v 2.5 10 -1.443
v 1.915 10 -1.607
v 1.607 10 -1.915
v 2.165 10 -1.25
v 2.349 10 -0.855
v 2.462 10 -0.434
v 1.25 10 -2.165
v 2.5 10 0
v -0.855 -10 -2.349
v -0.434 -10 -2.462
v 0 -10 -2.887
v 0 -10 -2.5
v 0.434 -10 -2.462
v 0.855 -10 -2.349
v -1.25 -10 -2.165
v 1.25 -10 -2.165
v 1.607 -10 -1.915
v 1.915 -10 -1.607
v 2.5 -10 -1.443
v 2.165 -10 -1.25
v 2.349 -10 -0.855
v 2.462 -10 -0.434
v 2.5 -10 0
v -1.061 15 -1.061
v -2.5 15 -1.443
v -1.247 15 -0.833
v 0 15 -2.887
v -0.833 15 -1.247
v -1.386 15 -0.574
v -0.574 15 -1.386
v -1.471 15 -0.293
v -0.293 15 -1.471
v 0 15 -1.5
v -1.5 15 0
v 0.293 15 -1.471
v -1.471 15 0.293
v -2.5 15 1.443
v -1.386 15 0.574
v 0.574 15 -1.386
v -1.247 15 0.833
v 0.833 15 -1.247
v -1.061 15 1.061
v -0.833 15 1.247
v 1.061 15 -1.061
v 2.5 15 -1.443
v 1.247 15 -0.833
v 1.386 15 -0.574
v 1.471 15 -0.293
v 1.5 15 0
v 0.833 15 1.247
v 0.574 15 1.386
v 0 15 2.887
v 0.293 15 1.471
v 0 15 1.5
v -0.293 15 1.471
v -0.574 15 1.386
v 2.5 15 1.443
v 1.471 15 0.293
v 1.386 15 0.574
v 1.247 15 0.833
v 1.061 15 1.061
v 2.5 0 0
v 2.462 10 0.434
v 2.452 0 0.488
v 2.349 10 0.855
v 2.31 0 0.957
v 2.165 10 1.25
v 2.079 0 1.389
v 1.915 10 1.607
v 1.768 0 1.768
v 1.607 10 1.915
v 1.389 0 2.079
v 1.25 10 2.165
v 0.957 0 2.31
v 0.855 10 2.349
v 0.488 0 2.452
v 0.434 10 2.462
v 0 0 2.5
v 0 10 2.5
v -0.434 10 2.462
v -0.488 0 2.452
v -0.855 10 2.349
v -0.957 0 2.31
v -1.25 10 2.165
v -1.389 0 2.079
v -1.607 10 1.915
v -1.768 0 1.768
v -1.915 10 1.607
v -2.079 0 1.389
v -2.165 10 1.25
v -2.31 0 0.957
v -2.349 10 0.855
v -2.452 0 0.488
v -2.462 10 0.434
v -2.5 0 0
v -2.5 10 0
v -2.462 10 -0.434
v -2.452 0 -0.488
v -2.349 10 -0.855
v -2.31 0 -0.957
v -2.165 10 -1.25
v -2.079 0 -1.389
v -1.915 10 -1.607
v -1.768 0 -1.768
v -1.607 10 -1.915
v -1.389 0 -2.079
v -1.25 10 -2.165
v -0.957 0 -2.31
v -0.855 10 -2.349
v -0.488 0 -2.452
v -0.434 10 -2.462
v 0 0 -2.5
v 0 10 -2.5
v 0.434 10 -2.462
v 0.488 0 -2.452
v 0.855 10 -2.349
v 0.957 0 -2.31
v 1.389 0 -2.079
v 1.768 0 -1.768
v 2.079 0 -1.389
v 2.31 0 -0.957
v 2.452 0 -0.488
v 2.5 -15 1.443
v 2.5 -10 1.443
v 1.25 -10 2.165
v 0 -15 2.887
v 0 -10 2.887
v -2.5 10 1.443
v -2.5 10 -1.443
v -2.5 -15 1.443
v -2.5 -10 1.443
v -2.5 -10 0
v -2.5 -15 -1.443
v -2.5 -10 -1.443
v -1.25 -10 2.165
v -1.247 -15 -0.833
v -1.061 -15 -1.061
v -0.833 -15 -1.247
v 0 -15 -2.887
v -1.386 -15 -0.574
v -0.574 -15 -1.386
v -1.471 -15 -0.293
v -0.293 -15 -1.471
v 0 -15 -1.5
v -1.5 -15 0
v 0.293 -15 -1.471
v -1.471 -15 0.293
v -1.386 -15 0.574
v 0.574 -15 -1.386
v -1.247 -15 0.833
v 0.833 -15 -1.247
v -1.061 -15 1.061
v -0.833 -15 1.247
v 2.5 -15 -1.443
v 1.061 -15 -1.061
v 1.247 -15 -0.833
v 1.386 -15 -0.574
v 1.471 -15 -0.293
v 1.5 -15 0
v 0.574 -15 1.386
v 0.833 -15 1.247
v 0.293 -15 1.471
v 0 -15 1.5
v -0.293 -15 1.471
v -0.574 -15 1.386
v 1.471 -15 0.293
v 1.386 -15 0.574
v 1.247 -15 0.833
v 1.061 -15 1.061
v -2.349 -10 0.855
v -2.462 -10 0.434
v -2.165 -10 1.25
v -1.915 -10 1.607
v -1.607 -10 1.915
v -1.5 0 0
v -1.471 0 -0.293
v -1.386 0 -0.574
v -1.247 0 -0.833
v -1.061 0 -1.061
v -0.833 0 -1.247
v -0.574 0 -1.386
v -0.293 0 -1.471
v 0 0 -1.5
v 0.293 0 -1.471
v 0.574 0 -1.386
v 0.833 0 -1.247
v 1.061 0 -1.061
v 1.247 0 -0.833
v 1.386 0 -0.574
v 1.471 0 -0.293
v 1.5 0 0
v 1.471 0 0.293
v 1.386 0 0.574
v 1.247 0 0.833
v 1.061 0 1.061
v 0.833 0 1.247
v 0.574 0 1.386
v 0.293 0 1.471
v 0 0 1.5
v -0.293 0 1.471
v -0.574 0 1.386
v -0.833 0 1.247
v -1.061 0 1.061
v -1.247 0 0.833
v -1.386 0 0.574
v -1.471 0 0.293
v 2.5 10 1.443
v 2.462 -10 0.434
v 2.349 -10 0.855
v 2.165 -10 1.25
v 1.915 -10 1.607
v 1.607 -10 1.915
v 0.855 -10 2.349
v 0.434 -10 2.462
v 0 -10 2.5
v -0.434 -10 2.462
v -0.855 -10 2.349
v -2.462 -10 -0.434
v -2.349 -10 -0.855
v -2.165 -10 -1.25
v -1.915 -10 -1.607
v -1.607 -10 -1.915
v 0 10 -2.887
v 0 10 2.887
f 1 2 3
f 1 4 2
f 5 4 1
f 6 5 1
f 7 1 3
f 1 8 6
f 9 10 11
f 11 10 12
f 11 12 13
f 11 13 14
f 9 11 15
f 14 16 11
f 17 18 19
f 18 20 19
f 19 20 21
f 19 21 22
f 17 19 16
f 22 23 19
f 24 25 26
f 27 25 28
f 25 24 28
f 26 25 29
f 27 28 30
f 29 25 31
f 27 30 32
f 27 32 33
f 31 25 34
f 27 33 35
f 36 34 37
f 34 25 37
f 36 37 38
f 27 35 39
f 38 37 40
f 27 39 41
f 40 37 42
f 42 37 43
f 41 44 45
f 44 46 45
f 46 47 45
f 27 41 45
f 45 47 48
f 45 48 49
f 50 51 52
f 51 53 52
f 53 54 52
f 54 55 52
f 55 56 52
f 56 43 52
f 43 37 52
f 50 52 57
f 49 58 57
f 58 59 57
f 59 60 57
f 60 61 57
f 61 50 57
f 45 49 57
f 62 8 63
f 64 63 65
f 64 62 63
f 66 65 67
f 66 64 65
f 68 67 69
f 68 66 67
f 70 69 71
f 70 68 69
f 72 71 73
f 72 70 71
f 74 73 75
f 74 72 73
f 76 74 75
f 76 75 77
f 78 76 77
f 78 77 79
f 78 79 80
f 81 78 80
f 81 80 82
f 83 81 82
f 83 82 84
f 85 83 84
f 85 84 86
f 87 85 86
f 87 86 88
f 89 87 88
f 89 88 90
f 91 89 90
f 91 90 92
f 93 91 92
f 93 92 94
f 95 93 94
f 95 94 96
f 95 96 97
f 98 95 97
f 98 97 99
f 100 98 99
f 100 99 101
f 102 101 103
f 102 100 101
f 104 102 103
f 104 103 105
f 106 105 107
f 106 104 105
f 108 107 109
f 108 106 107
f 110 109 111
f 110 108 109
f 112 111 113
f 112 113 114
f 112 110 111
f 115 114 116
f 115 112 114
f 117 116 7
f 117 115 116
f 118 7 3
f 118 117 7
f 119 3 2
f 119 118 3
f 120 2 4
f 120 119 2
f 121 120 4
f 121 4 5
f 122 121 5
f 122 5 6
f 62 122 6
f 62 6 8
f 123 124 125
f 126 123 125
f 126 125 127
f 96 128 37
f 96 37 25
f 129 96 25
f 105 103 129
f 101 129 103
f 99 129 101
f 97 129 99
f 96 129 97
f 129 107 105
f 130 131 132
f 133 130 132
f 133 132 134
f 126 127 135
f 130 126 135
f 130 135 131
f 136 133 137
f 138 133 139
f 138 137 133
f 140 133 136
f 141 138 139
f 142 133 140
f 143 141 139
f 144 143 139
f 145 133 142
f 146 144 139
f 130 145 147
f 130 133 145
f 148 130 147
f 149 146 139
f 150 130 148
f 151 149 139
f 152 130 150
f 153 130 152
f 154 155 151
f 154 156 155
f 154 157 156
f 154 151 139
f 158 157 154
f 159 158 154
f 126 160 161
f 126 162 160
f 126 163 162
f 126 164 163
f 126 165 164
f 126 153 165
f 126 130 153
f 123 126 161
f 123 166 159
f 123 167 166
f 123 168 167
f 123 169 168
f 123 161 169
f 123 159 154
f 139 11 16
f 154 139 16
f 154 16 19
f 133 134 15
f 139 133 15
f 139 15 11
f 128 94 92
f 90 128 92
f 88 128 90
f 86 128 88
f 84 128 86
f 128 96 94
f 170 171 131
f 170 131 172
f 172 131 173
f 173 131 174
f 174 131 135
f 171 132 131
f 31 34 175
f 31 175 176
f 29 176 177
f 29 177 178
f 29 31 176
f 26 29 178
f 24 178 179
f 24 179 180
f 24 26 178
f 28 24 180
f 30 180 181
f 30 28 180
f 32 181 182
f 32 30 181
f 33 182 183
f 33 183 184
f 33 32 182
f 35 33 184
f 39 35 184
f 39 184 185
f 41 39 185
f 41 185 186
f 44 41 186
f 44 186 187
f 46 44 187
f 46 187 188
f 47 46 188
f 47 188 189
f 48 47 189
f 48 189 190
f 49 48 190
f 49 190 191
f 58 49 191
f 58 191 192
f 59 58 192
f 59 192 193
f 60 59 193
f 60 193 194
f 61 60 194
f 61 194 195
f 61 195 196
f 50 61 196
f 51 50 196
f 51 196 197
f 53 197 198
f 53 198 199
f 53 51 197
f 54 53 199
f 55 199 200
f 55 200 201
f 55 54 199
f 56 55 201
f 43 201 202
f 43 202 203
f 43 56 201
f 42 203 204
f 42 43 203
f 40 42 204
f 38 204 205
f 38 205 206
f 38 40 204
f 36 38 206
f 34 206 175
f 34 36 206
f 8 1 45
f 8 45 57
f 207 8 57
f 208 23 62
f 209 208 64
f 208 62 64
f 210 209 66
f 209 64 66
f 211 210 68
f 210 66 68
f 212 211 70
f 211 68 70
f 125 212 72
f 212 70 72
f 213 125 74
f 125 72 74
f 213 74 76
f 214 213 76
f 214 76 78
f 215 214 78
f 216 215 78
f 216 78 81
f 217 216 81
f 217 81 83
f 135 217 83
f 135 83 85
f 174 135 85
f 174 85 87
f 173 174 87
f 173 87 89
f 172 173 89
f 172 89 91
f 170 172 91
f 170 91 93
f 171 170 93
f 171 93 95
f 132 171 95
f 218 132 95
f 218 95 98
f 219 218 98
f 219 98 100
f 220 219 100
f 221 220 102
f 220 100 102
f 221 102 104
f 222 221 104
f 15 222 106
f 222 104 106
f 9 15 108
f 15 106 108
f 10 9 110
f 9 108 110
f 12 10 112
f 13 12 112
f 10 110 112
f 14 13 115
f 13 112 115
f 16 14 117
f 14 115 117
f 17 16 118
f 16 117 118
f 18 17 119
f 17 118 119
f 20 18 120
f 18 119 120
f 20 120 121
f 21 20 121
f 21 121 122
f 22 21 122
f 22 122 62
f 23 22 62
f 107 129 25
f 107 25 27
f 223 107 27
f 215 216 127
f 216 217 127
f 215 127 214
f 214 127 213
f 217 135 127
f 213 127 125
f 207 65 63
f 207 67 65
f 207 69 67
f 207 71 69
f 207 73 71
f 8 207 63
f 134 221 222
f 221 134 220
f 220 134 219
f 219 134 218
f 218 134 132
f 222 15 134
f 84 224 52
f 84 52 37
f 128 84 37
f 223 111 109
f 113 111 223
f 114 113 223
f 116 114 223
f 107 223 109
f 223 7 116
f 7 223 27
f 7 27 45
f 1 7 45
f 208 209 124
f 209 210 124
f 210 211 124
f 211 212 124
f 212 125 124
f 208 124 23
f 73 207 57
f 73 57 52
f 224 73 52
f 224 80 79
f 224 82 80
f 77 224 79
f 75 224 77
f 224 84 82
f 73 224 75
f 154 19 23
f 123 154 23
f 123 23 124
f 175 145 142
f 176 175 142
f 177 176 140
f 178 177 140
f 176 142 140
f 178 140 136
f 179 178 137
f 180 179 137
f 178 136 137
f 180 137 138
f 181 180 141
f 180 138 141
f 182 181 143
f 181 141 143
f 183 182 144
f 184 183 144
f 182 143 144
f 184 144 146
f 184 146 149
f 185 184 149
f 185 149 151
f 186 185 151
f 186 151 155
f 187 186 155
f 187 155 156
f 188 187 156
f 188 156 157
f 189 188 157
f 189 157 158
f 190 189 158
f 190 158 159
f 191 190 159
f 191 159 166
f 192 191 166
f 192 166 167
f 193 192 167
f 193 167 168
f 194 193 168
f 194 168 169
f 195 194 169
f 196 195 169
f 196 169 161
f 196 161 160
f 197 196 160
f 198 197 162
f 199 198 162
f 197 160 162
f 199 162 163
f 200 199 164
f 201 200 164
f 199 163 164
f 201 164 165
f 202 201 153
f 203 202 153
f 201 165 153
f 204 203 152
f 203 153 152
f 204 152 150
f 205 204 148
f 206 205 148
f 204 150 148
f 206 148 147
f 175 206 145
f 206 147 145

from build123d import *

# Parameters (mm, degrees)
F1_R     = 2.5
F2_DEPTH = 10
F4_DEPTH = 5
F5_D     = 3


# Not quite as in the source:
# - a feature names something its author has since deleted; it is built from what else it names


with BuildPart() as f2:
    # F1 (on Front) → F2 (new body)
    with BuildSketch(Plane.XZ):
        Circle(F1_R)
    extrude(amount=F2_DEPTH)

    # F3 (on face) → F4 (join)
    with BuildSketch(Plane.XZ.offset(10)):
        Polygon((-2.5, 1.443375673), (-2.5, -1.443375673), (0, -2.8867513459), (2.5, -1.443375673), (2.5, 1.443375673), (0, 2.8867513459), align=None)
    extrude(amount=F4_DEPTH)

    # F5 (through all)
    with Locations(Plane(origin=(0, 0, 0), x_dir=(1, 0, 0), z_dir=(0, 1, 0))):
        with Locations((0, 0)):
            Hole(F5_D / 2)

    # F6: F2 across face


with BuildPart() as f2_1:
    add(f2.part)
    add(f2.part.mirror(Plane.XZ))


solid = f2_1.part
